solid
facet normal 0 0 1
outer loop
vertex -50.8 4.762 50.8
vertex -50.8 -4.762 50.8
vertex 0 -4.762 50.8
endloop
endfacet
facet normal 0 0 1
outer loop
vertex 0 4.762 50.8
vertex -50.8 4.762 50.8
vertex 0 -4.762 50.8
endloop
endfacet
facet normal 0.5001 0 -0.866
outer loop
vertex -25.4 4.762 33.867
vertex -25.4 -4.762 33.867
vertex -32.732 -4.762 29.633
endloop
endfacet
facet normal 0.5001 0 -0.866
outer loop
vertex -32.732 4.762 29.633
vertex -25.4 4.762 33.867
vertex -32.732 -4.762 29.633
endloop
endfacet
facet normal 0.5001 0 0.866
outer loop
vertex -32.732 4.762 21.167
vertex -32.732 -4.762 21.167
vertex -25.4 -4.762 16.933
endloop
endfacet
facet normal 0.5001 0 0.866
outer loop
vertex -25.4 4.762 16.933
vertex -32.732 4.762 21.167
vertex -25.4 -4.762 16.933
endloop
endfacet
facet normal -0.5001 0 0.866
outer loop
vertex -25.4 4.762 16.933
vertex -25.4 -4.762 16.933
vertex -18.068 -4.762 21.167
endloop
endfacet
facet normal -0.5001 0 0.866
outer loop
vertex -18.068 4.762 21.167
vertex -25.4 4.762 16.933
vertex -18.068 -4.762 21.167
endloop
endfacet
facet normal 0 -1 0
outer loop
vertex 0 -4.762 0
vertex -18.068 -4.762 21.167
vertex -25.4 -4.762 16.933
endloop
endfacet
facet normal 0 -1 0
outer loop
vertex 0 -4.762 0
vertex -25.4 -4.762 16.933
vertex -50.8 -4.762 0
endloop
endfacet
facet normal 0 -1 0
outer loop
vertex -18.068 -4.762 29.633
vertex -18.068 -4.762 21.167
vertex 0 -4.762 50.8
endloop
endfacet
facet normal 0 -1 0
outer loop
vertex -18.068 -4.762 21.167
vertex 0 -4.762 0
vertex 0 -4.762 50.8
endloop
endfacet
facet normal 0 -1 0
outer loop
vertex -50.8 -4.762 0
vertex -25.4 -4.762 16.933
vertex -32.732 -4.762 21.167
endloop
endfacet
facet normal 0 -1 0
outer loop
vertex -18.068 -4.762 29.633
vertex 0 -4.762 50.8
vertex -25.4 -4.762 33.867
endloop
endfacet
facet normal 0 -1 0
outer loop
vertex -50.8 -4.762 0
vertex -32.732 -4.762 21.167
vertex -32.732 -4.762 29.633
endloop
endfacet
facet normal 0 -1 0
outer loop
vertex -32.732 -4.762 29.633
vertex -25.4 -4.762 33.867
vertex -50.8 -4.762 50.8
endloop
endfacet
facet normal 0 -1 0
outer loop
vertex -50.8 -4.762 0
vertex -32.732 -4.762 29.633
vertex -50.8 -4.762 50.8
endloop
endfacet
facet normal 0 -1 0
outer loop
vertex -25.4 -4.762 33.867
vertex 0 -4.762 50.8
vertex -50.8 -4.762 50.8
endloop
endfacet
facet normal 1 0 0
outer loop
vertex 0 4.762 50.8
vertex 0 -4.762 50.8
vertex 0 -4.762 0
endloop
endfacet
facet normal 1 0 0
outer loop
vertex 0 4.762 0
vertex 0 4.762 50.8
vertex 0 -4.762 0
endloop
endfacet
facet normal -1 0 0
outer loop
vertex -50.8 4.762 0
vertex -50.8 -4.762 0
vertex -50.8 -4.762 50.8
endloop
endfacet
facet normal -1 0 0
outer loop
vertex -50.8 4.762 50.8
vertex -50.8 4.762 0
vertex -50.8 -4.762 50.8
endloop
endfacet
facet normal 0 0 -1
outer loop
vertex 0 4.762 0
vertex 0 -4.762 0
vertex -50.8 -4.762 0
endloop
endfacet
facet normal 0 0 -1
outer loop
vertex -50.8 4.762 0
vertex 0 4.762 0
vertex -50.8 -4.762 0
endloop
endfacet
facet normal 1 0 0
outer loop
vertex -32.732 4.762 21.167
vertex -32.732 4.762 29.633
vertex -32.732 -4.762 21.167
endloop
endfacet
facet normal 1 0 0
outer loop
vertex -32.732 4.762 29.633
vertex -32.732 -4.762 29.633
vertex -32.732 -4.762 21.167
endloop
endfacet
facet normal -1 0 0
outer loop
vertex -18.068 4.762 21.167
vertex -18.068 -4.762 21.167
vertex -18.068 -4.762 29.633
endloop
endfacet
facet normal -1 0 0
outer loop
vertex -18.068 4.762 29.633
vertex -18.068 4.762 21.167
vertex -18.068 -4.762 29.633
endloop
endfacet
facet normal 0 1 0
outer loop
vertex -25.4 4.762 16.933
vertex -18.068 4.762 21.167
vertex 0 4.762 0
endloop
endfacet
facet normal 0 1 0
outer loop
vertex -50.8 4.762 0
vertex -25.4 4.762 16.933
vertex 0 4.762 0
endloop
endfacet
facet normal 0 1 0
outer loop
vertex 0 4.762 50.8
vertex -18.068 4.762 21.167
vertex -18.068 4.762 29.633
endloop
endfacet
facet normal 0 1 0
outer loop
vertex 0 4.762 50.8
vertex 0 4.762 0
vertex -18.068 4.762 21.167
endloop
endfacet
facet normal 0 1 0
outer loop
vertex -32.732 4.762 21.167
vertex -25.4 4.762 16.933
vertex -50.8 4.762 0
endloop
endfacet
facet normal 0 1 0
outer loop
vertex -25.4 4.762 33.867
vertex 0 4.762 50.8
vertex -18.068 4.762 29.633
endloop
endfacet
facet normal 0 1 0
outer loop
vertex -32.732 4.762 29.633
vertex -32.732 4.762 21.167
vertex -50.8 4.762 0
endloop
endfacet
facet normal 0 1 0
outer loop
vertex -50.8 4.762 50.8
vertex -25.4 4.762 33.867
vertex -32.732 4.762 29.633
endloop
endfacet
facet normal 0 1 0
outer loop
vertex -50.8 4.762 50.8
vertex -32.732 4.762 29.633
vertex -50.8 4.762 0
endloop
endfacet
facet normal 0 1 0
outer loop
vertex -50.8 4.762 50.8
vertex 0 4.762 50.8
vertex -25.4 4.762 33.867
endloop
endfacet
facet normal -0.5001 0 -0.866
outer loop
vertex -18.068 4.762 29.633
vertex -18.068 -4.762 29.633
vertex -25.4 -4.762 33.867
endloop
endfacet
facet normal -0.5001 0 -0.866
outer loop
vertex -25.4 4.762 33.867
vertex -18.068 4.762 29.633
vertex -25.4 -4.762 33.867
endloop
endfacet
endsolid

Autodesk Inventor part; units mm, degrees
ref_plane "YZ Plane" through (0, 0, 0) normal (1, 0, 0) x (0, 1, 0)
ref_plane "XZ Plane" through (0, 0, 0) normal (0, 1, 0) x (-1, 0, 0)
ref_plane "XY Plane" through (0, 0, 0) normal (0, 0, 1) x (1, 0, 0)
sketch "Sketch1" plane through (0, 0, 0) normal (0, 1, 0) x (-1, 0, 0)
  line L0 (50.8, 0) -> (50.8, 50.8)
  line L1 (50.8, 50.8) -> (0, 50.8)
  line L2 (0, 50.8) -> (0, 0)
  line L3 (0, 0) -> (50.8, 0)
  line L4 (25.4, 16.9333) -> (18.0677, 21.1667)
  line L5 (18.0677, 21.1667) -> (18.0677, 29.6333)
  line L6 (18.0677, 29.6333) -> (25.4, 33.8667)
  line L7 (25.4, 33.8667) -> (32.7323, 29.6333)
  line L8 (32.7323, 29.6333) -> (32.7323, 21.1667)
  line L9 (32.7323, 21.1667) -> (25.4, 16.9333)
  point P0 (25.4, 25.4)
  point P1 (21.7338, 19.05)
  point P2 (29.0662, 31.75)
  dimension "d0" = 50.8
  dimension "d1" = 50.8
  dimension "d4" = 12.7
extrude "Extrusion1" add sketch "Sketch1" along normal mid plane 9.525
properties part number "Hex Box"
